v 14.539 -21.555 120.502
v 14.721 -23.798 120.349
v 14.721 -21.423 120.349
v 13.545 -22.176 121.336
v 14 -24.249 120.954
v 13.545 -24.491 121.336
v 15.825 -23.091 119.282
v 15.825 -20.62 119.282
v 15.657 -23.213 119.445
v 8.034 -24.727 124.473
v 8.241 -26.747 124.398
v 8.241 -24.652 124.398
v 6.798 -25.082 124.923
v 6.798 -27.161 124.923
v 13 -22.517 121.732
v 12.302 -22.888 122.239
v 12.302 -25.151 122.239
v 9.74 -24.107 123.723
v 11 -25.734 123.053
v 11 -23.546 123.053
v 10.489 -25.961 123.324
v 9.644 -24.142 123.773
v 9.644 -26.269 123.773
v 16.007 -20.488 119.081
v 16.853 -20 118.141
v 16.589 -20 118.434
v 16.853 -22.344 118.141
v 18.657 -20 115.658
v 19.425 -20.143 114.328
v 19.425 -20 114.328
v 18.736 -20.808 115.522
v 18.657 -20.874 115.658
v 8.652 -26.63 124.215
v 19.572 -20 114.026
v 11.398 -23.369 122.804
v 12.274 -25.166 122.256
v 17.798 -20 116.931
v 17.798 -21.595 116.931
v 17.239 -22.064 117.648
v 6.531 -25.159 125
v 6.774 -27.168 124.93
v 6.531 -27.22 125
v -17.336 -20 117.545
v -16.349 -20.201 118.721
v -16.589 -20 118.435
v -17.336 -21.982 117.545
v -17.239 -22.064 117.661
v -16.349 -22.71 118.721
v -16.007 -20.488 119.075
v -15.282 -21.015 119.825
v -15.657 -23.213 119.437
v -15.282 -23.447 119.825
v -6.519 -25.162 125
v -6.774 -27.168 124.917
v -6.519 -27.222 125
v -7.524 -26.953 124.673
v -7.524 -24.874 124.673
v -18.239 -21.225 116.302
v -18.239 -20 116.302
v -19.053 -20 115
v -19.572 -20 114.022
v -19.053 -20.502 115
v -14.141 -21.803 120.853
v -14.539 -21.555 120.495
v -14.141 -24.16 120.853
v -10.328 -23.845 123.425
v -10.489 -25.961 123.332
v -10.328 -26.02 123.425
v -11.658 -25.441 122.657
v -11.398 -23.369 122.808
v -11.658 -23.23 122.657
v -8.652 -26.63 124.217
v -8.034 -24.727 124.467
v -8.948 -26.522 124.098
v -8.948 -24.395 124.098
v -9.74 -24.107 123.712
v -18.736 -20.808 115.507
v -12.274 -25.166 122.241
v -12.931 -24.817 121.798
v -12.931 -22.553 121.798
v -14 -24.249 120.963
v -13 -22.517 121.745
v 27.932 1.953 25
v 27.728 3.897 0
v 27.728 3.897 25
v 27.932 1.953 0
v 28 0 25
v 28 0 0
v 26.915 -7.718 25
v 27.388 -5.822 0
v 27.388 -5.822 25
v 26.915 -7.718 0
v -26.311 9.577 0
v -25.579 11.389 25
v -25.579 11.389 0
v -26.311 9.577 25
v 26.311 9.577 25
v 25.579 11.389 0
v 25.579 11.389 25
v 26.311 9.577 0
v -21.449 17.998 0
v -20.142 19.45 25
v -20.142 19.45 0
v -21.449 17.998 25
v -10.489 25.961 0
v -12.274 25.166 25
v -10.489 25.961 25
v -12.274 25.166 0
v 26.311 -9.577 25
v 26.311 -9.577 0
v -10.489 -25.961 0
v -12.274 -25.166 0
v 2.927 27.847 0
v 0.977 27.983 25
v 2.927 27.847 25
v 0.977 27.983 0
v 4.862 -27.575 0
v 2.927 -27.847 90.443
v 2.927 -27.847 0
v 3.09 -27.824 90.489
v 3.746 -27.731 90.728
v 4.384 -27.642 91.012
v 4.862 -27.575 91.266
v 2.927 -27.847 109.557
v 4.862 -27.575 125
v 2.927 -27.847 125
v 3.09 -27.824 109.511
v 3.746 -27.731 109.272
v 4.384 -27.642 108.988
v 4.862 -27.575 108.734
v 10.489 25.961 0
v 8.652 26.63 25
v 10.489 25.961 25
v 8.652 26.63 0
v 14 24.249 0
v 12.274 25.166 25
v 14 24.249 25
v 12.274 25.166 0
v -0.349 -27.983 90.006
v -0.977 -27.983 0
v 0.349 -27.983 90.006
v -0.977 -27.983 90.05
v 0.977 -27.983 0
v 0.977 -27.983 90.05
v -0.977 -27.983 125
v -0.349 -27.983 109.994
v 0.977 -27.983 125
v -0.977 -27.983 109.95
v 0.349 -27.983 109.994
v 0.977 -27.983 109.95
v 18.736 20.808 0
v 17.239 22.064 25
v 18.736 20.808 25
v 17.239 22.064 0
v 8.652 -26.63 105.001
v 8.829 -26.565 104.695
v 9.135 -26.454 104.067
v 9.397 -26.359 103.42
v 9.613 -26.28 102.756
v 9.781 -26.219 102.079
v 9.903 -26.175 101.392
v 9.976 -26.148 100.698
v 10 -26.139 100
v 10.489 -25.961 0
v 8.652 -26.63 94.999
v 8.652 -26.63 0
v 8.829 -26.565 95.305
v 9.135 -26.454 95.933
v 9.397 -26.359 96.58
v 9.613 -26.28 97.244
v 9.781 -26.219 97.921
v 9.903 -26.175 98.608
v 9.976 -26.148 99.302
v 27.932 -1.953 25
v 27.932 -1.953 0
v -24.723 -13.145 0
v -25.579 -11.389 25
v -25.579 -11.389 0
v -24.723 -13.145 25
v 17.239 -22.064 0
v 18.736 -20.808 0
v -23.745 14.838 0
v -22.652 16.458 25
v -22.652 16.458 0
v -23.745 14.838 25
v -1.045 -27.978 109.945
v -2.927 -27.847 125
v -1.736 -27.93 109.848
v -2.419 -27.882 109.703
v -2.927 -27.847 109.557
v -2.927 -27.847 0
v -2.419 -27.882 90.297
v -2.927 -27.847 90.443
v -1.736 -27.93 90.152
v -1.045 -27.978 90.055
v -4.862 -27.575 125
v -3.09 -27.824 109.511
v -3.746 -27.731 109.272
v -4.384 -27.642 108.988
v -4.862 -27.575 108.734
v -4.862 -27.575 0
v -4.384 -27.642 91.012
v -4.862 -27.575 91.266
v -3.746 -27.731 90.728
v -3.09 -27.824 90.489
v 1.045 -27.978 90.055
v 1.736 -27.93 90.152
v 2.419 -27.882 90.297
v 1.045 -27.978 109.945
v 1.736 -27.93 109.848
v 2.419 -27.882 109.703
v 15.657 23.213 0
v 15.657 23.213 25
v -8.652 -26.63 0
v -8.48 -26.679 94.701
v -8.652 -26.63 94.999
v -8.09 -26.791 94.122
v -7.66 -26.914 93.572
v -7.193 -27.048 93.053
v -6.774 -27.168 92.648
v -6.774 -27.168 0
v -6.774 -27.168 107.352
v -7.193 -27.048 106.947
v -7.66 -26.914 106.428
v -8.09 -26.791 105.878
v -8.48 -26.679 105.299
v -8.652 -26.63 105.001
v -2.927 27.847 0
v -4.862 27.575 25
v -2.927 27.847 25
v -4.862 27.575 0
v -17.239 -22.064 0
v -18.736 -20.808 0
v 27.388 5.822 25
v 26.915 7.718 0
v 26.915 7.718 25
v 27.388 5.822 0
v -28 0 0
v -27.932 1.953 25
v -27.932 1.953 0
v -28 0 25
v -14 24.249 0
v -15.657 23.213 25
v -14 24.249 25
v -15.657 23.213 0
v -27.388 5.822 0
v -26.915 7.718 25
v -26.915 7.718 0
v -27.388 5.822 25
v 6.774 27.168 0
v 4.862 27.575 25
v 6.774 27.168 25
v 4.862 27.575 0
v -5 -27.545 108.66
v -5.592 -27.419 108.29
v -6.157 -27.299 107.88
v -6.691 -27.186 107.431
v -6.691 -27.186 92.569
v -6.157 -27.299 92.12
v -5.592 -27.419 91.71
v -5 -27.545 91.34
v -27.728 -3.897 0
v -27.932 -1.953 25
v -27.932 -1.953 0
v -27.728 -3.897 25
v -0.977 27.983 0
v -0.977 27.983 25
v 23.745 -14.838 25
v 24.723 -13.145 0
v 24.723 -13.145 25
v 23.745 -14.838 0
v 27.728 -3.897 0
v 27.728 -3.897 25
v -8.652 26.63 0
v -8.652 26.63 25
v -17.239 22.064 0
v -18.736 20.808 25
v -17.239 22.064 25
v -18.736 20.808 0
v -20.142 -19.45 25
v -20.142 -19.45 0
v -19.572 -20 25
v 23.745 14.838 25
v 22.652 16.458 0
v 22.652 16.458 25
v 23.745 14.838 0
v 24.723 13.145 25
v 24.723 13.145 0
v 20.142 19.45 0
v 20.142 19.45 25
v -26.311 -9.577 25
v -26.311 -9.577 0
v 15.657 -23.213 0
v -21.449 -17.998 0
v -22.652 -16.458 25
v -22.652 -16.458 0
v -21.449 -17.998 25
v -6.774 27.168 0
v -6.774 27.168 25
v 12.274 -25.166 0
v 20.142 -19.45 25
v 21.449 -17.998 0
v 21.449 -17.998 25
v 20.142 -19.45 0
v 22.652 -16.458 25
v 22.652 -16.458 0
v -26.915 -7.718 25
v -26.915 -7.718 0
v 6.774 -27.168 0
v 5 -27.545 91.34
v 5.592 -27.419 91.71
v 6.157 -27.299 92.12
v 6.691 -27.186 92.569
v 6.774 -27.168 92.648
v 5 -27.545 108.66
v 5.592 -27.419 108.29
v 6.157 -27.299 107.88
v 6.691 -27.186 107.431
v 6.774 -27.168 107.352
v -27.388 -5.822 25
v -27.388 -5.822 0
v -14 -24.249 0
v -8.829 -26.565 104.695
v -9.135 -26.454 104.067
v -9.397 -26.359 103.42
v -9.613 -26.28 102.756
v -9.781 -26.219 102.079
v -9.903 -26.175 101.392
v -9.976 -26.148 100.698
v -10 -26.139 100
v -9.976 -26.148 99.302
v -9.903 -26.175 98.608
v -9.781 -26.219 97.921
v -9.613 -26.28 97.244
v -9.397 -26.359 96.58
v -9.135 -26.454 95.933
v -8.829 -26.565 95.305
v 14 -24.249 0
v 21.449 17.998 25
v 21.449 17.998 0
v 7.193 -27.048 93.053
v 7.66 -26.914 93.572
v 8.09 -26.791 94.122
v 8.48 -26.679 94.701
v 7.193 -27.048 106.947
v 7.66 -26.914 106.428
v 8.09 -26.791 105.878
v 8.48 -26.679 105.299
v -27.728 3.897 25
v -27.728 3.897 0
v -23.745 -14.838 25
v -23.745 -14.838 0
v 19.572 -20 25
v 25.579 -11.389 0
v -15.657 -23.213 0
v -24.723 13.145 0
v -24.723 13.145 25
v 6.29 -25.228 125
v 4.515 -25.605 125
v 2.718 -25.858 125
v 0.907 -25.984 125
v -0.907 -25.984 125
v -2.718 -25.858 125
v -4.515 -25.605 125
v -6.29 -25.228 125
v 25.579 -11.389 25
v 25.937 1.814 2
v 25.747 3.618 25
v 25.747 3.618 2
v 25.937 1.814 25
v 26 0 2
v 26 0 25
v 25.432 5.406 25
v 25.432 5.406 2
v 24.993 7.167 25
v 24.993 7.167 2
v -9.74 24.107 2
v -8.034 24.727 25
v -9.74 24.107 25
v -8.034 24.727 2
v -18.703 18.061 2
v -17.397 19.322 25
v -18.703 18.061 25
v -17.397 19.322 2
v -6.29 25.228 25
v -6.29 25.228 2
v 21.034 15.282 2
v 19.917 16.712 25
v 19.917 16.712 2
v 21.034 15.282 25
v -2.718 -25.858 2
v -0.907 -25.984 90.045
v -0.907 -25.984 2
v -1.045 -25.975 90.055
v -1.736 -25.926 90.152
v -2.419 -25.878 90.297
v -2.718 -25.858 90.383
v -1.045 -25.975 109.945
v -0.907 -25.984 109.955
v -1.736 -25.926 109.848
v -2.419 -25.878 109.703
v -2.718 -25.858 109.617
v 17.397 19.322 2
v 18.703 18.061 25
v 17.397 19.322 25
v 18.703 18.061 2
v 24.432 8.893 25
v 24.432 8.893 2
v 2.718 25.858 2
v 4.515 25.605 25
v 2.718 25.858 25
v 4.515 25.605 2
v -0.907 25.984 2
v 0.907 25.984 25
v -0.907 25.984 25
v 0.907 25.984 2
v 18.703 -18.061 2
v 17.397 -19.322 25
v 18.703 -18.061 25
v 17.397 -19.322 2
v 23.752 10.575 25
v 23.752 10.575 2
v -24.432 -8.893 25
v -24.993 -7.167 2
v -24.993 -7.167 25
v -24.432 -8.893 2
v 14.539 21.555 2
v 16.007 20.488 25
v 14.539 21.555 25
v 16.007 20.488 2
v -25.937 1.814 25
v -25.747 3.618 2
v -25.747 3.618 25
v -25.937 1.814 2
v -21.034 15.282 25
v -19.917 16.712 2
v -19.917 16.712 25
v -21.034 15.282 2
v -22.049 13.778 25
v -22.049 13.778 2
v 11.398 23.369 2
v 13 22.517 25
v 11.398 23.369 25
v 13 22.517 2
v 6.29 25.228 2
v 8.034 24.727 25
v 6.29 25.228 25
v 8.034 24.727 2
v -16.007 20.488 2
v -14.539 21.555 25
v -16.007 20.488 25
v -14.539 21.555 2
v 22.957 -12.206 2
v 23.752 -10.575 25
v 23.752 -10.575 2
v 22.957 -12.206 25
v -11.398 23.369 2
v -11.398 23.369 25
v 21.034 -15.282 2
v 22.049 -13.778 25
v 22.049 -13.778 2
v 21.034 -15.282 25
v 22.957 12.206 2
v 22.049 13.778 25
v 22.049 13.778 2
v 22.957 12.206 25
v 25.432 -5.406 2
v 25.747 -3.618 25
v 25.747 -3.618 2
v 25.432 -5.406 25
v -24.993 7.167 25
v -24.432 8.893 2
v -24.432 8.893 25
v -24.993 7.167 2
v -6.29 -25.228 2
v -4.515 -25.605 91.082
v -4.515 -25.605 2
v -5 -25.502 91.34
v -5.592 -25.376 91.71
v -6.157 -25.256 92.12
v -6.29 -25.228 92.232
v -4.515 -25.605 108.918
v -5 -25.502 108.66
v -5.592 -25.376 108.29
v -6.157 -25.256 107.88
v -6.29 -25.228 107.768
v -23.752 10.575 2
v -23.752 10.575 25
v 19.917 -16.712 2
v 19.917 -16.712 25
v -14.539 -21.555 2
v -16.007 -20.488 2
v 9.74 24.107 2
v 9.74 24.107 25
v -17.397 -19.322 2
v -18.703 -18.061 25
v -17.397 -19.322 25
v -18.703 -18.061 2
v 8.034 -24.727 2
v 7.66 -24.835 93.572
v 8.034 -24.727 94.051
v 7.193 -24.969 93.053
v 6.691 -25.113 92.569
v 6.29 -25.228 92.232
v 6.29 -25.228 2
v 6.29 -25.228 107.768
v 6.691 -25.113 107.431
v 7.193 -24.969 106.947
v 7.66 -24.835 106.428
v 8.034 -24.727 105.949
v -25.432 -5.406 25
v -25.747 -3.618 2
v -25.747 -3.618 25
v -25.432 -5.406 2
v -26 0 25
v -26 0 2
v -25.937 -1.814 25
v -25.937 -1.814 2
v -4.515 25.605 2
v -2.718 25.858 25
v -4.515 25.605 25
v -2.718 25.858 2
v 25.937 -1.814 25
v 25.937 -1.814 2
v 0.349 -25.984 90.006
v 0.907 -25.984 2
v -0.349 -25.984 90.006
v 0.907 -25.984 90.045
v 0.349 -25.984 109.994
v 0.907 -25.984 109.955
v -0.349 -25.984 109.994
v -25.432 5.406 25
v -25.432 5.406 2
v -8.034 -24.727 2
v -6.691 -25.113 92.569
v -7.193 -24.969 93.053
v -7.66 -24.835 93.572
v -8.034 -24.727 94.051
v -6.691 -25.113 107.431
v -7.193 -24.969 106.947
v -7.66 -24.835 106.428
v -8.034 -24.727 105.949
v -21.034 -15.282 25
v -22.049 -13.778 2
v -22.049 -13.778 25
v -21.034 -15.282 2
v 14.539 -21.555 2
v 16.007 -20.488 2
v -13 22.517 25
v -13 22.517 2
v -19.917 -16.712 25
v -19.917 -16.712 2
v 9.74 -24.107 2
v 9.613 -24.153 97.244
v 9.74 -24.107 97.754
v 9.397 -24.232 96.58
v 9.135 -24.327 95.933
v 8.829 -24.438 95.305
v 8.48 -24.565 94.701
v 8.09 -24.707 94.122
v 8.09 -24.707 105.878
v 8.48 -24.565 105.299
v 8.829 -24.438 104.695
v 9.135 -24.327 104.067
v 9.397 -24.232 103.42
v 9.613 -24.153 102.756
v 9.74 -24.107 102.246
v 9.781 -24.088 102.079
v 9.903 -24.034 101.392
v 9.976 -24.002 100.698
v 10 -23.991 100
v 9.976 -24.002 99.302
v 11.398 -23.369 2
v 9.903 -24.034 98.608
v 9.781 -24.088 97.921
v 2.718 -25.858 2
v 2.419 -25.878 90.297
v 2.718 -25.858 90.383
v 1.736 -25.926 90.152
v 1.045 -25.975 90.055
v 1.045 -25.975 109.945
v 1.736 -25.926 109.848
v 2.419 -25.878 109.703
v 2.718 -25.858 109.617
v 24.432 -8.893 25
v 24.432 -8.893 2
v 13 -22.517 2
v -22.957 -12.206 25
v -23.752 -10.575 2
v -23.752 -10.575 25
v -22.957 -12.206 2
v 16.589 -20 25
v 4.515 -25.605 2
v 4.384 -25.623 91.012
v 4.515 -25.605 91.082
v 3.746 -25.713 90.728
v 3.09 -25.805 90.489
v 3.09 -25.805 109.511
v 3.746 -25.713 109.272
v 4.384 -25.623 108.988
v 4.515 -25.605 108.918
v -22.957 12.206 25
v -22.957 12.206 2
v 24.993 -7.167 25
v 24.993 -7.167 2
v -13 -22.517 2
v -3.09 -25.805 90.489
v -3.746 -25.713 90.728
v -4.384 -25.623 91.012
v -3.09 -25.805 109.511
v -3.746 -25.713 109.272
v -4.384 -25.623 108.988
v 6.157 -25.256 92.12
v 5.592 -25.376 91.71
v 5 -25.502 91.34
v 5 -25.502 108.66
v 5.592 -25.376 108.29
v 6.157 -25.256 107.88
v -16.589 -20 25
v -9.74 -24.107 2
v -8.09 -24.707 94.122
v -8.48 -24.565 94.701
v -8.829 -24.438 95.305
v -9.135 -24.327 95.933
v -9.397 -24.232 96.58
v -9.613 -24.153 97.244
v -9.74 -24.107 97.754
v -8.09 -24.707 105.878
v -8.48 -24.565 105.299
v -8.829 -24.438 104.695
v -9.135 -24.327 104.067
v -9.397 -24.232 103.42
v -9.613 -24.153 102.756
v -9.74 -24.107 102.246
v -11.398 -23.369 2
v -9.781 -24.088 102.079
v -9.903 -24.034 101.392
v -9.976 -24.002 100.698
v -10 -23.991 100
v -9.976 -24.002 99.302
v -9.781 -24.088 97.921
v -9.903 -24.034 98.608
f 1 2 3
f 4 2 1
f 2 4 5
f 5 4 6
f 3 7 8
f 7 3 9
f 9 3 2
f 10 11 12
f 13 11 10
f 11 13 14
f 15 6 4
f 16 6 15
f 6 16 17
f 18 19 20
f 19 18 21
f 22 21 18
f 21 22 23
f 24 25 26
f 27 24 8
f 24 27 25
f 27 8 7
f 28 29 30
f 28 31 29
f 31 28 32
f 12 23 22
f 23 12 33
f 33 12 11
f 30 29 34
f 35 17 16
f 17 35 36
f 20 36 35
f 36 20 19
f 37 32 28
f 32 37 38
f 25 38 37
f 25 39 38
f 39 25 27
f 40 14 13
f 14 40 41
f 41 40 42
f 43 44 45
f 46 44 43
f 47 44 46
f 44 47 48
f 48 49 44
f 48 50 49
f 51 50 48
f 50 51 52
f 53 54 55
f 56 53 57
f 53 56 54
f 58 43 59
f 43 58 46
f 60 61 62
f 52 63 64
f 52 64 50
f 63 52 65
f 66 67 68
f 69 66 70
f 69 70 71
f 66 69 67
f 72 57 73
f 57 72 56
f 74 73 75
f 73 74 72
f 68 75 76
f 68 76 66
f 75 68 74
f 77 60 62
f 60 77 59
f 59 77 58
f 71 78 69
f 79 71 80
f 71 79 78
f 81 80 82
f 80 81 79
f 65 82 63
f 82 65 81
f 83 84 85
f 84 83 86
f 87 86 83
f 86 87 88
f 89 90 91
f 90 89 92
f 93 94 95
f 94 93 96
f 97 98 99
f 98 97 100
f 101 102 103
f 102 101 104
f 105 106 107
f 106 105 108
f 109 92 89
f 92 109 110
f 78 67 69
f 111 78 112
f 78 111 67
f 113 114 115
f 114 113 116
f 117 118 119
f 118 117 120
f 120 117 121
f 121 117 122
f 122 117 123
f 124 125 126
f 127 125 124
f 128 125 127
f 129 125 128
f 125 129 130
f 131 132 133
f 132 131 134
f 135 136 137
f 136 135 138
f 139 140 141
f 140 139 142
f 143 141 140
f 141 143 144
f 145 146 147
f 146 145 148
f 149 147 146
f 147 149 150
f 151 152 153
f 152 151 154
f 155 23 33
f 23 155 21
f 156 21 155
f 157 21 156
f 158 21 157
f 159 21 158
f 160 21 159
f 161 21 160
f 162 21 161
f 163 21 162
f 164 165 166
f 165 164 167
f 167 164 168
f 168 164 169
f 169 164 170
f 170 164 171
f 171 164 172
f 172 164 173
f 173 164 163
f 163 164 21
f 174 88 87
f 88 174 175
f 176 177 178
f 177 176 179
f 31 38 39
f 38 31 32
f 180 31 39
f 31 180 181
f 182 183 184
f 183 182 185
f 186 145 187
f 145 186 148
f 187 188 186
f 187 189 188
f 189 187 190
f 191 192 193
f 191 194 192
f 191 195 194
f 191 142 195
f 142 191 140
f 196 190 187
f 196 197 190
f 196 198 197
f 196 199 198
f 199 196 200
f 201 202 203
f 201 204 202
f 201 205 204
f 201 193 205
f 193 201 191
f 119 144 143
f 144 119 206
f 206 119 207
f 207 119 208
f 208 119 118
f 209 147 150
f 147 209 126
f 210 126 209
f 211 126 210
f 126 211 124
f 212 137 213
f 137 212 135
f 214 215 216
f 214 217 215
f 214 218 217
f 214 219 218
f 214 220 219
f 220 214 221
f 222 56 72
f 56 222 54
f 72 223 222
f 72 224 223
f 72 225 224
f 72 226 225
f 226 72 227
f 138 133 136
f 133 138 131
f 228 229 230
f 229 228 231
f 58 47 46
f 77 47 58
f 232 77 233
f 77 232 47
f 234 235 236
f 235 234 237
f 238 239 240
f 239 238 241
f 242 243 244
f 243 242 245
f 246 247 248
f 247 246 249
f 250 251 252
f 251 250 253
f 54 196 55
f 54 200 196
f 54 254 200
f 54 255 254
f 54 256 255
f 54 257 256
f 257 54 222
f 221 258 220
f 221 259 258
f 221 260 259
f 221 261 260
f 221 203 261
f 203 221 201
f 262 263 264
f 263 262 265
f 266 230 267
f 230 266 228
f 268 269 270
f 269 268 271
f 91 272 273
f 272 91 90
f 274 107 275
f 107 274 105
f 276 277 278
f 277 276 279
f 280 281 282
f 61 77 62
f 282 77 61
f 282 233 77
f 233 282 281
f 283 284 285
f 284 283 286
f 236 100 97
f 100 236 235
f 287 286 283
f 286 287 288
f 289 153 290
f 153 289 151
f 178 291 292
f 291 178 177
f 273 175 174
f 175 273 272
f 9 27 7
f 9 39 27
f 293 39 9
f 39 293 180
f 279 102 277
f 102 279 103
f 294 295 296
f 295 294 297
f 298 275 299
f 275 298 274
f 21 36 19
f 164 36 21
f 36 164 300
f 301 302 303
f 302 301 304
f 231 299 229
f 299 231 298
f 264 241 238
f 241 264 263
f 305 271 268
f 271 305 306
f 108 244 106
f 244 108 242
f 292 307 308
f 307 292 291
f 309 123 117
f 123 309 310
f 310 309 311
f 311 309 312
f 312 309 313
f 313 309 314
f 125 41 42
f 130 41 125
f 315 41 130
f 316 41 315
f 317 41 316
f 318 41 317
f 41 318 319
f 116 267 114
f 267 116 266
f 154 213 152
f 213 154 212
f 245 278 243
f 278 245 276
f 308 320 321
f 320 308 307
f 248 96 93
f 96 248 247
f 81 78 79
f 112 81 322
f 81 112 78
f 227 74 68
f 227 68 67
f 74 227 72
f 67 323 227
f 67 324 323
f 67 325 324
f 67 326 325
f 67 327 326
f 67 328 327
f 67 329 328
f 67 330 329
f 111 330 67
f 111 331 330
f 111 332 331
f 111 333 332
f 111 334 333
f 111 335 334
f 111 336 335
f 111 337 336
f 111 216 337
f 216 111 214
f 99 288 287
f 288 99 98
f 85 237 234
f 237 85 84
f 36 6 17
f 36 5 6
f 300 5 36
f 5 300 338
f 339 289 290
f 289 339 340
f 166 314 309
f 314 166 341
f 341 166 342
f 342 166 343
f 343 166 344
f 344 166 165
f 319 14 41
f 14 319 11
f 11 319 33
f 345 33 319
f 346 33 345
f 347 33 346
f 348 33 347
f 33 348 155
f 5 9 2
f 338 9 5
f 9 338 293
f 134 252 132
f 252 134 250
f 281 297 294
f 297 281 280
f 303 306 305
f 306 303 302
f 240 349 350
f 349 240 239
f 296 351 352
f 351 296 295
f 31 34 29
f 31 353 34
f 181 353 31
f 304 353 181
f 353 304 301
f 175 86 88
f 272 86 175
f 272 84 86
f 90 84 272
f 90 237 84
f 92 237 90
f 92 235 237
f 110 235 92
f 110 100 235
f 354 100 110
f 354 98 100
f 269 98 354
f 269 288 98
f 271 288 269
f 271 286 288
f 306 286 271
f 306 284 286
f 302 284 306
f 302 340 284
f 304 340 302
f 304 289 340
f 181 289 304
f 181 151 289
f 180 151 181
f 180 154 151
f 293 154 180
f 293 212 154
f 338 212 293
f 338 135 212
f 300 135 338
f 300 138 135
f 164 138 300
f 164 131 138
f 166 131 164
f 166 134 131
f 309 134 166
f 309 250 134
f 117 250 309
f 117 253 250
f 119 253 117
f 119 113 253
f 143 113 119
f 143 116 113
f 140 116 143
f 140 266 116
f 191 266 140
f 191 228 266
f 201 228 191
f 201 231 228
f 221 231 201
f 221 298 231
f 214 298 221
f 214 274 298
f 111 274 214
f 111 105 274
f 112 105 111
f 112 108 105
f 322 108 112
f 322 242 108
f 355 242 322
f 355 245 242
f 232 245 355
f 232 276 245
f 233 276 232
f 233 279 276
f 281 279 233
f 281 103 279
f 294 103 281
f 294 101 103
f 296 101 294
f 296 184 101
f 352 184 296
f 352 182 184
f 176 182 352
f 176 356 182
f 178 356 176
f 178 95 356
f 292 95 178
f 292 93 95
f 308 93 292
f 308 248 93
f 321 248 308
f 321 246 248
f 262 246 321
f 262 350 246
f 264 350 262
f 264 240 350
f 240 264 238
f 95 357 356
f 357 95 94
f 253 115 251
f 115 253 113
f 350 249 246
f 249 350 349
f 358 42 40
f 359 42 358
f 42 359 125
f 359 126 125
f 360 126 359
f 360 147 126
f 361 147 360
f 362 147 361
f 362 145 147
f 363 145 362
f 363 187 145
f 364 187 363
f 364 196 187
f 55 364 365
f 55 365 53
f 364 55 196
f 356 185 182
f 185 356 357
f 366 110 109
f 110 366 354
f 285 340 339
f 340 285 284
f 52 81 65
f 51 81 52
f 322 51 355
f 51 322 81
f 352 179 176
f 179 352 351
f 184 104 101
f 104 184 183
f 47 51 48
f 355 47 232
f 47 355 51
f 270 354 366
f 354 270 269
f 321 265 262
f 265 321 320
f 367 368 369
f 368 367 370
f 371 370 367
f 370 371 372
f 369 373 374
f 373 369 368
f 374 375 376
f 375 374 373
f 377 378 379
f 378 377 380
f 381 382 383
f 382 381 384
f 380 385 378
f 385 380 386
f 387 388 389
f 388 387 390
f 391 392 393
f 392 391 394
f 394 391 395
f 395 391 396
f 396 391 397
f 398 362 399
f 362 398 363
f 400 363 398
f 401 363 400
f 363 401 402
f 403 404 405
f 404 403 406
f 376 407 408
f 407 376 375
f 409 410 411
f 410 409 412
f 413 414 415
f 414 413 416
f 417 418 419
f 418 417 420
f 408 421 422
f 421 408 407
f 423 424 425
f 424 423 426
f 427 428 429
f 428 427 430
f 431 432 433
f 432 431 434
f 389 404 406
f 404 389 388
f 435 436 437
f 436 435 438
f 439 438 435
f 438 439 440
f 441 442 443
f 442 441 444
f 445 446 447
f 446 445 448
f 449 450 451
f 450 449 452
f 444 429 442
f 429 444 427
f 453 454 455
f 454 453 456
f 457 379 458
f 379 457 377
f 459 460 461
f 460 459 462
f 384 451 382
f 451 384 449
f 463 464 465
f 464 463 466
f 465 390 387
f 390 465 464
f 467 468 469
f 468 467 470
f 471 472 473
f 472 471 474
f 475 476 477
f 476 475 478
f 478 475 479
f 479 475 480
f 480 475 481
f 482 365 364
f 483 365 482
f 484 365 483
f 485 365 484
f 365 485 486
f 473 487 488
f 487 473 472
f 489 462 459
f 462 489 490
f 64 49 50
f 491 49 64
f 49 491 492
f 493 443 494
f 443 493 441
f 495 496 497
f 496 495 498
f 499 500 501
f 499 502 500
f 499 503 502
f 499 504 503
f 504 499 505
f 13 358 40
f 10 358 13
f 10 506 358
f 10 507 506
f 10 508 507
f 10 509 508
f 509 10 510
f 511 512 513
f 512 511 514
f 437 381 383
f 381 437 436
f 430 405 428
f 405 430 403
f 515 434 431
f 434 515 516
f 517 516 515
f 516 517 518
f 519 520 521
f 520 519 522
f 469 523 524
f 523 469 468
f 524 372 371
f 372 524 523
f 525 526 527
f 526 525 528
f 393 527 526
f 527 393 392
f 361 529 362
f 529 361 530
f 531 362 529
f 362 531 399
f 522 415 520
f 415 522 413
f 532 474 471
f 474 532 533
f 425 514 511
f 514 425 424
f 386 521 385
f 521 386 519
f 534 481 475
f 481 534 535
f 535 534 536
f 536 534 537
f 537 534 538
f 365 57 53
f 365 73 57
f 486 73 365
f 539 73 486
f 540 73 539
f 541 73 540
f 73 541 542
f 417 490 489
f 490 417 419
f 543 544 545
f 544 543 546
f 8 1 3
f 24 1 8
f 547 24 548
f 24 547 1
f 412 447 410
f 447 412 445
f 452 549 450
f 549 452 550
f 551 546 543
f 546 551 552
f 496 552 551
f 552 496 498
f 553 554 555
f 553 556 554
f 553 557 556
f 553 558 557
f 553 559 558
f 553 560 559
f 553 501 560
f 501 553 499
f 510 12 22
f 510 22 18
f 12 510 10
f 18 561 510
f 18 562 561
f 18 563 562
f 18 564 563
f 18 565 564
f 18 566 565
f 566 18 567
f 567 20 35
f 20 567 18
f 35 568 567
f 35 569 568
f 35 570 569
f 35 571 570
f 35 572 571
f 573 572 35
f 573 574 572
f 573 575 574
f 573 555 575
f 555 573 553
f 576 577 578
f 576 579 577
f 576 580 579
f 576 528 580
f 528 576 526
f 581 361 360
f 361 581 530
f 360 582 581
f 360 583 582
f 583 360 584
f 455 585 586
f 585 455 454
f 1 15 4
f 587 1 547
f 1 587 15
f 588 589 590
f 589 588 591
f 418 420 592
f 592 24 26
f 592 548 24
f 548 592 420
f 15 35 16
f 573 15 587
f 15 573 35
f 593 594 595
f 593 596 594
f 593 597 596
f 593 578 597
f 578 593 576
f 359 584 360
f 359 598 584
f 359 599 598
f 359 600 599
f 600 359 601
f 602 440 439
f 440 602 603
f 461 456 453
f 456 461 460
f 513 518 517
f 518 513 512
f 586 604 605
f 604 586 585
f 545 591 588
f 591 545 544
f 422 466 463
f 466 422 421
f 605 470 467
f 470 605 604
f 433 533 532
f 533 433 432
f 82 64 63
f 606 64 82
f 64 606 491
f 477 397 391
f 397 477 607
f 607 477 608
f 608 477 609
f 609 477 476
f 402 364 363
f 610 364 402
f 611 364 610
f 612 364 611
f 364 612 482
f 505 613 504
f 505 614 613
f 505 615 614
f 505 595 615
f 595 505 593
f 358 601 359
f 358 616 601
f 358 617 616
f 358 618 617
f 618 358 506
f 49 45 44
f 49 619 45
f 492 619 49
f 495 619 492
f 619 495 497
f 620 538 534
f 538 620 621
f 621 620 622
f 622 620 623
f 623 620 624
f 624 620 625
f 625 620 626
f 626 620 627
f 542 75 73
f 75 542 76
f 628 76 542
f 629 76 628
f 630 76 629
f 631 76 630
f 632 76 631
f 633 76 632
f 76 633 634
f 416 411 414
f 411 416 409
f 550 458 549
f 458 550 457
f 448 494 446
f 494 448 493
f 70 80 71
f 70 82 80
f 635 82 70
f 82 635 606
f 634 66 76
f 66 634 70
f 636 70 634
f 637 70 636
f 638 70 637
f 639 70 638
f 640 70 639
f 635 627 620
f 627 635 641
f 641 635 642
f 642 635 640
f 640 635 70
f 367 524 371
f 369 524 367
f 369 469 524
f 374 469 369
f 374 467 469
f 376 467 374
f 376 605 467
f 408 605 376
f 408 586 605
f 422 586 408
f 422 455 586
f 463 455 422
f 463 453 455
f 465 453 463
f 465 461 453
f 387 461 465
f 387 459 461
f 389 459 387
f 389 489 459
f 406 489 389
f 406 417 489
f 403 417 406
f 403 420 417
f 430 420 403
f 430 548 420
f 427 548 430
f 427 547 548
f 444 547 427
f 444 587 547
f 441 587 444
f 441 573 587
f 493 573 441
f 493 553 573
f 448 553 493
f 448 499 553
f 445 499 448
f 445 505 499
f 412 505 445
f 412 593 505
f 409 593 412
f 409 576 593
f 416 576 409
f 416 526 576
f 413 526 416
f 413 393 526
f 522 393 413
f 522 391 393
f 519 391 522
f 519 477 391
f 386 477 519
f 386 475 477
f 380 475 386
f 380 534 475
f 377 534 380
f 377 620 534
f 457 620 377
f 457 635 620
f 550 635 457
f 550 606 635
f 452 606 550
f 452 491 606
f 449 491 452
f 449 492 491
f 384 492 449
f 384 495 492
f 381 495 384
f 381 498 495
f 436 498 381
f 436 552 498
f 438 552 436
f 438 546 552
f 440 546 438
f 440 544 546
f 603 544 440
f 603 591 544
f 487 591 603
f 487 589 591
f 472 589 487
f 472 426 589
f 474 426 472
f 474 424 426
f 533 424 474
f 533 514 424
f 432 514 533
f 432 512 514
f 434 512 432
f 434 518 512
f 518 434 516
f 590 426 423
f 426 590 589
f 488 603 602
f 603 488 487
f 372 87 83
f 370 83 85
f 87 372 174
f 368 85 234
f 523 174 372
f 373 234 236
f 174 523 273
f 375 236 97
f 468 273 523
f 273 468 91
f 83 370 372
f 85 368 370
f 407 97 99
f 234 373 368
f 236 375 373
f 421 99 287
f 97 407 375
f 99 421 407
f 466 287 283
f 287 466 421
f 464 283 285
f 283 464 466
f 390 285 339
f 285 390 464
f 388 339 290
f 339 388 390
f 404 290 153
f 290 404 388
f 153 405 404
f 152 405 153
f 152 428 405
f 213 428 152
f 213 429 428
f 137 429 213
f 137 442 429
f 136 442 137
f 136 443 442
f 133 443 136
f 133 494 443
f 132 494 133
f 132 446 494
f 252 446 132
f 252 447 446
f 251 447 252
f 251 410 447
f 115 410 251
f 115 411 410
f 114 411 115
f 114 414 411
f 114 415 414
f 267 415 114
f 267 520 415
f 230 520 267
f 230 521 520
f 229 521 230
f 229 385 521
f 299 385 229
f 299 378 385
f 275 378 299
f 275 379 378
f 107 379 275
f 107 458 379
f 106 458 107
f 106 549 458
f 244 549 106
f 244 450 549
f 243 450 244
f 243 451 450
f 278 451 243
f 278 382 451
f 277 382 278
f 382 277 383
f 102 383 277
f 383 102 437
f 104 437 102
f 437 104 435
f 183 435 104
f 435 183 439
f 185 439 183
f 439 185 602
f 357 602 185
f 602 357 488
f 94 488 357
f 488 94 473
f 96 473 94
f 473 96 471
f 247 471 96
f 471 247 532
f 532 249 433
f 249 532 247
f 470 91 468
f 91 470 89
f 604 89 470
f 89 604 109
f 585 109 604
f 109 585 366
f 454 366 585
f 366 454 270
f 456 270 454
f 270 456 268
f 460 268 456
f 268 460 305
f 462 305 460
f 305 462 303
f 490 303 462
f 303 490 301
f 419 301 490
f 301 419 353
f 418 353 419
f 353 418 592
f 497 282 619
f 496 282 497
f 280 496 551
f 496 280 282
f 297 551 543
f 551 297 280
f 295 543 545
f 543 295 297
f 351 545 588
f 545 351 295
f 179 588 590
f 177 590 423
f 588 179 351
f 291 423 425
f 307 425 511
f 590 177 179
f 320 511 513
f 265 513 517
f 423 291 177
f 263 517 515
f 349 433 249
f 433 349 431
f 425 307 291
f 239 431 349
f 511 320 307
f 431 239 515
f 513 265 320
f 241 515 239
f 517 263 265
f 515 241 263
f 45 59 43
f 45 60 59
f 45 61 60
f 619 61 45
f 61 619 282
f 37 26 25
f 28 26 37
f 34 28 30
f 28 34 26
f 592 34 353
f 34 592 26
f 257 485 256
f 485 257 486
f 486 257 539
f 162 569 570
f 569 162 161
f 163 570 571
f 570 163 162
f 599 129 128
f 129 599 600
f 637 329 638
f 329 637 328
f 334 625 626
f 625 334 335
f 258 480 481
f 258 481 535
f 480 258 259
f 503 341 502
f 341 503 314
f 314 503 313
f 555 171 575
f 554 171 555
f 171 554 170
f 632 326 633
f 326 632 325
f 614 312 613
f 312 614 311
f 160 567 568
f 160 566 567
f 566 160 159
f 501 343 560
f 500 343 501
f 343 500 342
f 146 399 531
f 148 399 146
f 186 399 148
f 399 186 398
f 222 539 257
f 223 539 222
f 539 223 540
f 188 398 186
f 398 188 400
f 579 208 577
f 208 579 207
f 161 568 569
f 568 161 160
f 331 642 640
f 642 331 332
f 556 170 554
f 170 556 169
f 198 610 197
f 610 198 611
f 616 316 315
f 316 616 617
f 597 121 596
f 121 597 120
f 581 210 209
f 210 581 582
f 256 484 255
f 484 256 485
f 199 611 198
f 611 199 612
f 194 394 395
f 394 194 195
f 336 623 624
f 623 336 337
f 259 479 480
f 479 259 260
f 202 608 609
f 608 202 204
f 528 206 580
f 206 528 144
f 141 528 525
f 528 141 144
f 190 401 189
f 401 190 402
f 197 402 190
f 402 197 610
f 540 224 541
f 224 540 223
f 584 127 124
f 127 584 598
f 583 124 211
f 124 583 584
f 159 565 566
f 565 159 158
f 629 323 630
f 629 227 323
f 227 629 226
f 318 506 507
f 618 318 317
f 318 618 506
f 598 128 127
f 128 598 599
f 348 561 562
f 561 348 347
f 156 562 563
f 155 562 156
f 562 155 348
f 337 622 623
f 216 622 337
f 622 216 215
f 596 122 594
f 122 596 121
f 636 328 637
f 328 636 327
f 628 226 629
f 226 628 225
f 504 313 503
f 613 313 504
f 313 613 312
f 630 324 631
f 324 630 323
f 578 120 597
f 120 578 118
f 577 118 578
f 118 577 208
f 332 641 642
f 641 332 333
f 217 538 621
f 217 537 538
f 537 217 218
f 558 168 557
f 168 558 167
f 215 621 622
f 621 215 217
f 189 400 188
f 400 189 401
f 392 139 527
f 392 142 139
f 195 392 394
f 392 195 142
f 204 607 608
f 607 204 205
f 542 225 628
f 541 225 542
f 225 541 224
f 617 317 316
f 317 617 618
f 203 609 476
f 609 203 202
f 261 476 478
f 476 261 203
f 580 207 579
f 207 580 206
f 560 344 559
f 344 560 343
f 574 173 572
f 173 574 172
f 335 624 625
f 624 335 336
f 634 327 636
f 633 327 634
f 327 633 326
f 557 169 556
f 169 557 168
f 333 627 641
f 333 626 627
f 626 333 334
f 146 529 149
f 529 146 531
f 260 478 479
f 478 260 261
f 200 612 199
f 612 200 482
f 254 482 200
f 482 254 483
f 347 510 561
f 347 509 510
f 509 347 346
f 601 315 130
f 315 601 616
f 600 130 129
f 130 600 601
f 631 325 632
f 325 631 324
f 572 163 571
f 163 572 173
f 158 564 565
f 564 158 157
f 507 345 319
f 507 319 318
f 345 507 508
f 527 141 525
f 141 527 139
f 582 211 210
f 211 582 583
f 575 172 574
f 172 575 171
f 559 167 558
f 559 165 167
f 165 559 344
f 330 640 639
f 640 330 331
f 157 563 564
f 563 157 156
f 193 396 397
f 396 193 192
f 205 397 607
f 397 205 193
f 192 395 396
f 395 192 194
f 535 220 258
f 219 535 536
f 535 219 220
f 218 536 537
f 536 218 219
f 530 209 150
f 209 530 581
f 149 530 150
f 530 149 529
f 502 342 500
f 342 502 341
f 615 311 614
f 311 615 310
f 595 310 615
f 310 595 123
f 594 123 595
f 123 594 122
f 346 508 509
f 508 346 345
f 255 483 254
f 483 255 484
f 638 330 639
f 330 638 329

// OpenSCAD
$fa=4; // default minimum facet angle is now 4
$fs=0.05; // default minimum facet size is now 0.05 mm

difference() {
  cylinder(r = 28, h = 125);
  translate([0, 0, 2]) cylinder(r = 26, h = 125);
  translate([-50, -20, 25]) cube([100, 100, 200]);
  translate([0, -10, 100]) rotate([90, 0, 0]) cylinder(r = 10, h = 25);
  translate([0, -10, 104]) rotate([90, 0, 0]) fillet(22, 25);
  translate([0, -10, 104]) rotate([90, -90, 0]) fillet(22, 25);
}

module fillet(r, l) {
  difference() {
    cube([r, r, l]);
    translate([0, 0, -.1]) cylinder(h = l + .2, r = r);
  }
}
